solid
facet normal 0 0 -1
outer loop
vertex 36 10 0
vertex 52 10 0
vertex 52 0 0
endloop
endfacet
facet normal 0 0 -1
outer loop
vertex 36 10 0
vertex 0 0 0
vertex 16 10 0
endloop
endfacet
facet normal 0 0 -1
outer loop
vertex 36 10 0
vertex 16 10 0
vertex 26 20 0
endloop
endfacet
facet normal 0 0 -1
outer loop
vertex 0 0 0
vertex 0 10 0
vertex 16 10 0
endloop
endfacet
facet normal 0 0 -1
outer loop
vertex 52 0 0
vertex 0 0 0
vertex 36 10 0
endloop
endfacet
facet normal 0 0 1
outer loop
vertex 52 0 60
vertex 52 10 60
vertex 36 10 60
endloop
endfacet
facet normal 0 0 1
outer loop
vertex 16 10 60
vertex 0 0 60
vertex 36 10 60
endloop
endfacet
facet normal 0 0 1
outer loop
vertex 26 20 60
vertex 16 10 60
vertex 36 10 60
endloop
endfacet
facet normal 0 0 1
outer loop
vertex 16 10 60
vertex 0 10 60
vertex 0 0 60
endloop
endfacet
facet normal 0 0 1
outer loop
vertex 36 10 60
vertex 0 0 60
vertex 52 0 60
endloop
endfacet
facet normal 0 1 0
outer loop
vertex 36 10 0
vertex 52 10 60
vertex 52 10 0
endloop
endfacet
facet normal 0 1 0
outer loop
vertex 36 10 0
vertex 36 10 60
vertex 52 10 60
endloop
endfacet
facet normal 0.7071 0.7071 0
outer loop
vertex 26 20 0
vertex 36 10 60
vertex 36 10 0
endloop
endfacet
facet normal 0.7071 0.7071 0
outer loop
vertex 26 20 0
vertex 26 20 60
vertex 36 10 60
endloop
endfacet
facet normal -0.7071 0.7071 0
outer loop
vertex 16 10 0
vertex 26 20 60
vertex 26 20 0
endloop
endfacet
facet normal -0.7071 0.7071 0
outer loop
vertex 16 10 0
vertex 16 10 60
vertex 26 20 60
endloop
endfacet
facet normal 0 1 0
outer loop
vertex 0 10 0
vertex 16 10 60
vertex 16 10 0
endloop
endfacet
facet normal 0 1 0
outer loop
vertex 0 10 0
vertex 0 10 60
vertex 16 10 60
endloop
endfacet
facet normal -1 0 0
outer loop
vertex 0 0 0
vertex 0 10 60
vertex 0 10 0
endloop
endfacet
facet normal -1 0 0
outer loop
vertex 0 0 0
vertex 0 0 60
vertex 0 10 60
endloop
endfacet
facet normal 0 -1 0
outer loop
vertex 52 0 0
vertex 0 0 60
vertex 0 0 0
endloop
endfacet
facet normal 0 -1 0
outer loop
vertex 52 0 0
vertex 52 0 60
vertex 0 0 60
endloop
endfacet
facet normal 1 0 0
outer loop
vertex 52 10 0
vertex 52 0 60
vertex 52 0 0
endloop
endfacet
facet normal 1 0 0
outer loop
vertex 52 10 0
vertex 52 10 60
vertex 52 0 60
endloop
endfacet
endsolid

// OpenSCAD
$fn = 32;

// ----------------------------------------------------------------------
// V guide rail: vrib, 52 mm wide
// ----------------------------------------------------------------------

// --- parameters (mm) ---
rail_w = 52;              // rail width, X
base_t = 10;              // base plate thickness
v_depth = 10;             // V feature depth / height
v_half_w = 10;            // half width of the V at the base face
plate_t = 60;             // rail length, Z (the extrusion height)

profile = [[0, 0], [52, 0], [52, 10], [36, 10], [26, 20], [16, 10], [0, 10]];  // primary outline, 7 points, counter clockwise

// --- the one profile operation ---
linear_extrude(height = plate_t) polygon(points = profile);
